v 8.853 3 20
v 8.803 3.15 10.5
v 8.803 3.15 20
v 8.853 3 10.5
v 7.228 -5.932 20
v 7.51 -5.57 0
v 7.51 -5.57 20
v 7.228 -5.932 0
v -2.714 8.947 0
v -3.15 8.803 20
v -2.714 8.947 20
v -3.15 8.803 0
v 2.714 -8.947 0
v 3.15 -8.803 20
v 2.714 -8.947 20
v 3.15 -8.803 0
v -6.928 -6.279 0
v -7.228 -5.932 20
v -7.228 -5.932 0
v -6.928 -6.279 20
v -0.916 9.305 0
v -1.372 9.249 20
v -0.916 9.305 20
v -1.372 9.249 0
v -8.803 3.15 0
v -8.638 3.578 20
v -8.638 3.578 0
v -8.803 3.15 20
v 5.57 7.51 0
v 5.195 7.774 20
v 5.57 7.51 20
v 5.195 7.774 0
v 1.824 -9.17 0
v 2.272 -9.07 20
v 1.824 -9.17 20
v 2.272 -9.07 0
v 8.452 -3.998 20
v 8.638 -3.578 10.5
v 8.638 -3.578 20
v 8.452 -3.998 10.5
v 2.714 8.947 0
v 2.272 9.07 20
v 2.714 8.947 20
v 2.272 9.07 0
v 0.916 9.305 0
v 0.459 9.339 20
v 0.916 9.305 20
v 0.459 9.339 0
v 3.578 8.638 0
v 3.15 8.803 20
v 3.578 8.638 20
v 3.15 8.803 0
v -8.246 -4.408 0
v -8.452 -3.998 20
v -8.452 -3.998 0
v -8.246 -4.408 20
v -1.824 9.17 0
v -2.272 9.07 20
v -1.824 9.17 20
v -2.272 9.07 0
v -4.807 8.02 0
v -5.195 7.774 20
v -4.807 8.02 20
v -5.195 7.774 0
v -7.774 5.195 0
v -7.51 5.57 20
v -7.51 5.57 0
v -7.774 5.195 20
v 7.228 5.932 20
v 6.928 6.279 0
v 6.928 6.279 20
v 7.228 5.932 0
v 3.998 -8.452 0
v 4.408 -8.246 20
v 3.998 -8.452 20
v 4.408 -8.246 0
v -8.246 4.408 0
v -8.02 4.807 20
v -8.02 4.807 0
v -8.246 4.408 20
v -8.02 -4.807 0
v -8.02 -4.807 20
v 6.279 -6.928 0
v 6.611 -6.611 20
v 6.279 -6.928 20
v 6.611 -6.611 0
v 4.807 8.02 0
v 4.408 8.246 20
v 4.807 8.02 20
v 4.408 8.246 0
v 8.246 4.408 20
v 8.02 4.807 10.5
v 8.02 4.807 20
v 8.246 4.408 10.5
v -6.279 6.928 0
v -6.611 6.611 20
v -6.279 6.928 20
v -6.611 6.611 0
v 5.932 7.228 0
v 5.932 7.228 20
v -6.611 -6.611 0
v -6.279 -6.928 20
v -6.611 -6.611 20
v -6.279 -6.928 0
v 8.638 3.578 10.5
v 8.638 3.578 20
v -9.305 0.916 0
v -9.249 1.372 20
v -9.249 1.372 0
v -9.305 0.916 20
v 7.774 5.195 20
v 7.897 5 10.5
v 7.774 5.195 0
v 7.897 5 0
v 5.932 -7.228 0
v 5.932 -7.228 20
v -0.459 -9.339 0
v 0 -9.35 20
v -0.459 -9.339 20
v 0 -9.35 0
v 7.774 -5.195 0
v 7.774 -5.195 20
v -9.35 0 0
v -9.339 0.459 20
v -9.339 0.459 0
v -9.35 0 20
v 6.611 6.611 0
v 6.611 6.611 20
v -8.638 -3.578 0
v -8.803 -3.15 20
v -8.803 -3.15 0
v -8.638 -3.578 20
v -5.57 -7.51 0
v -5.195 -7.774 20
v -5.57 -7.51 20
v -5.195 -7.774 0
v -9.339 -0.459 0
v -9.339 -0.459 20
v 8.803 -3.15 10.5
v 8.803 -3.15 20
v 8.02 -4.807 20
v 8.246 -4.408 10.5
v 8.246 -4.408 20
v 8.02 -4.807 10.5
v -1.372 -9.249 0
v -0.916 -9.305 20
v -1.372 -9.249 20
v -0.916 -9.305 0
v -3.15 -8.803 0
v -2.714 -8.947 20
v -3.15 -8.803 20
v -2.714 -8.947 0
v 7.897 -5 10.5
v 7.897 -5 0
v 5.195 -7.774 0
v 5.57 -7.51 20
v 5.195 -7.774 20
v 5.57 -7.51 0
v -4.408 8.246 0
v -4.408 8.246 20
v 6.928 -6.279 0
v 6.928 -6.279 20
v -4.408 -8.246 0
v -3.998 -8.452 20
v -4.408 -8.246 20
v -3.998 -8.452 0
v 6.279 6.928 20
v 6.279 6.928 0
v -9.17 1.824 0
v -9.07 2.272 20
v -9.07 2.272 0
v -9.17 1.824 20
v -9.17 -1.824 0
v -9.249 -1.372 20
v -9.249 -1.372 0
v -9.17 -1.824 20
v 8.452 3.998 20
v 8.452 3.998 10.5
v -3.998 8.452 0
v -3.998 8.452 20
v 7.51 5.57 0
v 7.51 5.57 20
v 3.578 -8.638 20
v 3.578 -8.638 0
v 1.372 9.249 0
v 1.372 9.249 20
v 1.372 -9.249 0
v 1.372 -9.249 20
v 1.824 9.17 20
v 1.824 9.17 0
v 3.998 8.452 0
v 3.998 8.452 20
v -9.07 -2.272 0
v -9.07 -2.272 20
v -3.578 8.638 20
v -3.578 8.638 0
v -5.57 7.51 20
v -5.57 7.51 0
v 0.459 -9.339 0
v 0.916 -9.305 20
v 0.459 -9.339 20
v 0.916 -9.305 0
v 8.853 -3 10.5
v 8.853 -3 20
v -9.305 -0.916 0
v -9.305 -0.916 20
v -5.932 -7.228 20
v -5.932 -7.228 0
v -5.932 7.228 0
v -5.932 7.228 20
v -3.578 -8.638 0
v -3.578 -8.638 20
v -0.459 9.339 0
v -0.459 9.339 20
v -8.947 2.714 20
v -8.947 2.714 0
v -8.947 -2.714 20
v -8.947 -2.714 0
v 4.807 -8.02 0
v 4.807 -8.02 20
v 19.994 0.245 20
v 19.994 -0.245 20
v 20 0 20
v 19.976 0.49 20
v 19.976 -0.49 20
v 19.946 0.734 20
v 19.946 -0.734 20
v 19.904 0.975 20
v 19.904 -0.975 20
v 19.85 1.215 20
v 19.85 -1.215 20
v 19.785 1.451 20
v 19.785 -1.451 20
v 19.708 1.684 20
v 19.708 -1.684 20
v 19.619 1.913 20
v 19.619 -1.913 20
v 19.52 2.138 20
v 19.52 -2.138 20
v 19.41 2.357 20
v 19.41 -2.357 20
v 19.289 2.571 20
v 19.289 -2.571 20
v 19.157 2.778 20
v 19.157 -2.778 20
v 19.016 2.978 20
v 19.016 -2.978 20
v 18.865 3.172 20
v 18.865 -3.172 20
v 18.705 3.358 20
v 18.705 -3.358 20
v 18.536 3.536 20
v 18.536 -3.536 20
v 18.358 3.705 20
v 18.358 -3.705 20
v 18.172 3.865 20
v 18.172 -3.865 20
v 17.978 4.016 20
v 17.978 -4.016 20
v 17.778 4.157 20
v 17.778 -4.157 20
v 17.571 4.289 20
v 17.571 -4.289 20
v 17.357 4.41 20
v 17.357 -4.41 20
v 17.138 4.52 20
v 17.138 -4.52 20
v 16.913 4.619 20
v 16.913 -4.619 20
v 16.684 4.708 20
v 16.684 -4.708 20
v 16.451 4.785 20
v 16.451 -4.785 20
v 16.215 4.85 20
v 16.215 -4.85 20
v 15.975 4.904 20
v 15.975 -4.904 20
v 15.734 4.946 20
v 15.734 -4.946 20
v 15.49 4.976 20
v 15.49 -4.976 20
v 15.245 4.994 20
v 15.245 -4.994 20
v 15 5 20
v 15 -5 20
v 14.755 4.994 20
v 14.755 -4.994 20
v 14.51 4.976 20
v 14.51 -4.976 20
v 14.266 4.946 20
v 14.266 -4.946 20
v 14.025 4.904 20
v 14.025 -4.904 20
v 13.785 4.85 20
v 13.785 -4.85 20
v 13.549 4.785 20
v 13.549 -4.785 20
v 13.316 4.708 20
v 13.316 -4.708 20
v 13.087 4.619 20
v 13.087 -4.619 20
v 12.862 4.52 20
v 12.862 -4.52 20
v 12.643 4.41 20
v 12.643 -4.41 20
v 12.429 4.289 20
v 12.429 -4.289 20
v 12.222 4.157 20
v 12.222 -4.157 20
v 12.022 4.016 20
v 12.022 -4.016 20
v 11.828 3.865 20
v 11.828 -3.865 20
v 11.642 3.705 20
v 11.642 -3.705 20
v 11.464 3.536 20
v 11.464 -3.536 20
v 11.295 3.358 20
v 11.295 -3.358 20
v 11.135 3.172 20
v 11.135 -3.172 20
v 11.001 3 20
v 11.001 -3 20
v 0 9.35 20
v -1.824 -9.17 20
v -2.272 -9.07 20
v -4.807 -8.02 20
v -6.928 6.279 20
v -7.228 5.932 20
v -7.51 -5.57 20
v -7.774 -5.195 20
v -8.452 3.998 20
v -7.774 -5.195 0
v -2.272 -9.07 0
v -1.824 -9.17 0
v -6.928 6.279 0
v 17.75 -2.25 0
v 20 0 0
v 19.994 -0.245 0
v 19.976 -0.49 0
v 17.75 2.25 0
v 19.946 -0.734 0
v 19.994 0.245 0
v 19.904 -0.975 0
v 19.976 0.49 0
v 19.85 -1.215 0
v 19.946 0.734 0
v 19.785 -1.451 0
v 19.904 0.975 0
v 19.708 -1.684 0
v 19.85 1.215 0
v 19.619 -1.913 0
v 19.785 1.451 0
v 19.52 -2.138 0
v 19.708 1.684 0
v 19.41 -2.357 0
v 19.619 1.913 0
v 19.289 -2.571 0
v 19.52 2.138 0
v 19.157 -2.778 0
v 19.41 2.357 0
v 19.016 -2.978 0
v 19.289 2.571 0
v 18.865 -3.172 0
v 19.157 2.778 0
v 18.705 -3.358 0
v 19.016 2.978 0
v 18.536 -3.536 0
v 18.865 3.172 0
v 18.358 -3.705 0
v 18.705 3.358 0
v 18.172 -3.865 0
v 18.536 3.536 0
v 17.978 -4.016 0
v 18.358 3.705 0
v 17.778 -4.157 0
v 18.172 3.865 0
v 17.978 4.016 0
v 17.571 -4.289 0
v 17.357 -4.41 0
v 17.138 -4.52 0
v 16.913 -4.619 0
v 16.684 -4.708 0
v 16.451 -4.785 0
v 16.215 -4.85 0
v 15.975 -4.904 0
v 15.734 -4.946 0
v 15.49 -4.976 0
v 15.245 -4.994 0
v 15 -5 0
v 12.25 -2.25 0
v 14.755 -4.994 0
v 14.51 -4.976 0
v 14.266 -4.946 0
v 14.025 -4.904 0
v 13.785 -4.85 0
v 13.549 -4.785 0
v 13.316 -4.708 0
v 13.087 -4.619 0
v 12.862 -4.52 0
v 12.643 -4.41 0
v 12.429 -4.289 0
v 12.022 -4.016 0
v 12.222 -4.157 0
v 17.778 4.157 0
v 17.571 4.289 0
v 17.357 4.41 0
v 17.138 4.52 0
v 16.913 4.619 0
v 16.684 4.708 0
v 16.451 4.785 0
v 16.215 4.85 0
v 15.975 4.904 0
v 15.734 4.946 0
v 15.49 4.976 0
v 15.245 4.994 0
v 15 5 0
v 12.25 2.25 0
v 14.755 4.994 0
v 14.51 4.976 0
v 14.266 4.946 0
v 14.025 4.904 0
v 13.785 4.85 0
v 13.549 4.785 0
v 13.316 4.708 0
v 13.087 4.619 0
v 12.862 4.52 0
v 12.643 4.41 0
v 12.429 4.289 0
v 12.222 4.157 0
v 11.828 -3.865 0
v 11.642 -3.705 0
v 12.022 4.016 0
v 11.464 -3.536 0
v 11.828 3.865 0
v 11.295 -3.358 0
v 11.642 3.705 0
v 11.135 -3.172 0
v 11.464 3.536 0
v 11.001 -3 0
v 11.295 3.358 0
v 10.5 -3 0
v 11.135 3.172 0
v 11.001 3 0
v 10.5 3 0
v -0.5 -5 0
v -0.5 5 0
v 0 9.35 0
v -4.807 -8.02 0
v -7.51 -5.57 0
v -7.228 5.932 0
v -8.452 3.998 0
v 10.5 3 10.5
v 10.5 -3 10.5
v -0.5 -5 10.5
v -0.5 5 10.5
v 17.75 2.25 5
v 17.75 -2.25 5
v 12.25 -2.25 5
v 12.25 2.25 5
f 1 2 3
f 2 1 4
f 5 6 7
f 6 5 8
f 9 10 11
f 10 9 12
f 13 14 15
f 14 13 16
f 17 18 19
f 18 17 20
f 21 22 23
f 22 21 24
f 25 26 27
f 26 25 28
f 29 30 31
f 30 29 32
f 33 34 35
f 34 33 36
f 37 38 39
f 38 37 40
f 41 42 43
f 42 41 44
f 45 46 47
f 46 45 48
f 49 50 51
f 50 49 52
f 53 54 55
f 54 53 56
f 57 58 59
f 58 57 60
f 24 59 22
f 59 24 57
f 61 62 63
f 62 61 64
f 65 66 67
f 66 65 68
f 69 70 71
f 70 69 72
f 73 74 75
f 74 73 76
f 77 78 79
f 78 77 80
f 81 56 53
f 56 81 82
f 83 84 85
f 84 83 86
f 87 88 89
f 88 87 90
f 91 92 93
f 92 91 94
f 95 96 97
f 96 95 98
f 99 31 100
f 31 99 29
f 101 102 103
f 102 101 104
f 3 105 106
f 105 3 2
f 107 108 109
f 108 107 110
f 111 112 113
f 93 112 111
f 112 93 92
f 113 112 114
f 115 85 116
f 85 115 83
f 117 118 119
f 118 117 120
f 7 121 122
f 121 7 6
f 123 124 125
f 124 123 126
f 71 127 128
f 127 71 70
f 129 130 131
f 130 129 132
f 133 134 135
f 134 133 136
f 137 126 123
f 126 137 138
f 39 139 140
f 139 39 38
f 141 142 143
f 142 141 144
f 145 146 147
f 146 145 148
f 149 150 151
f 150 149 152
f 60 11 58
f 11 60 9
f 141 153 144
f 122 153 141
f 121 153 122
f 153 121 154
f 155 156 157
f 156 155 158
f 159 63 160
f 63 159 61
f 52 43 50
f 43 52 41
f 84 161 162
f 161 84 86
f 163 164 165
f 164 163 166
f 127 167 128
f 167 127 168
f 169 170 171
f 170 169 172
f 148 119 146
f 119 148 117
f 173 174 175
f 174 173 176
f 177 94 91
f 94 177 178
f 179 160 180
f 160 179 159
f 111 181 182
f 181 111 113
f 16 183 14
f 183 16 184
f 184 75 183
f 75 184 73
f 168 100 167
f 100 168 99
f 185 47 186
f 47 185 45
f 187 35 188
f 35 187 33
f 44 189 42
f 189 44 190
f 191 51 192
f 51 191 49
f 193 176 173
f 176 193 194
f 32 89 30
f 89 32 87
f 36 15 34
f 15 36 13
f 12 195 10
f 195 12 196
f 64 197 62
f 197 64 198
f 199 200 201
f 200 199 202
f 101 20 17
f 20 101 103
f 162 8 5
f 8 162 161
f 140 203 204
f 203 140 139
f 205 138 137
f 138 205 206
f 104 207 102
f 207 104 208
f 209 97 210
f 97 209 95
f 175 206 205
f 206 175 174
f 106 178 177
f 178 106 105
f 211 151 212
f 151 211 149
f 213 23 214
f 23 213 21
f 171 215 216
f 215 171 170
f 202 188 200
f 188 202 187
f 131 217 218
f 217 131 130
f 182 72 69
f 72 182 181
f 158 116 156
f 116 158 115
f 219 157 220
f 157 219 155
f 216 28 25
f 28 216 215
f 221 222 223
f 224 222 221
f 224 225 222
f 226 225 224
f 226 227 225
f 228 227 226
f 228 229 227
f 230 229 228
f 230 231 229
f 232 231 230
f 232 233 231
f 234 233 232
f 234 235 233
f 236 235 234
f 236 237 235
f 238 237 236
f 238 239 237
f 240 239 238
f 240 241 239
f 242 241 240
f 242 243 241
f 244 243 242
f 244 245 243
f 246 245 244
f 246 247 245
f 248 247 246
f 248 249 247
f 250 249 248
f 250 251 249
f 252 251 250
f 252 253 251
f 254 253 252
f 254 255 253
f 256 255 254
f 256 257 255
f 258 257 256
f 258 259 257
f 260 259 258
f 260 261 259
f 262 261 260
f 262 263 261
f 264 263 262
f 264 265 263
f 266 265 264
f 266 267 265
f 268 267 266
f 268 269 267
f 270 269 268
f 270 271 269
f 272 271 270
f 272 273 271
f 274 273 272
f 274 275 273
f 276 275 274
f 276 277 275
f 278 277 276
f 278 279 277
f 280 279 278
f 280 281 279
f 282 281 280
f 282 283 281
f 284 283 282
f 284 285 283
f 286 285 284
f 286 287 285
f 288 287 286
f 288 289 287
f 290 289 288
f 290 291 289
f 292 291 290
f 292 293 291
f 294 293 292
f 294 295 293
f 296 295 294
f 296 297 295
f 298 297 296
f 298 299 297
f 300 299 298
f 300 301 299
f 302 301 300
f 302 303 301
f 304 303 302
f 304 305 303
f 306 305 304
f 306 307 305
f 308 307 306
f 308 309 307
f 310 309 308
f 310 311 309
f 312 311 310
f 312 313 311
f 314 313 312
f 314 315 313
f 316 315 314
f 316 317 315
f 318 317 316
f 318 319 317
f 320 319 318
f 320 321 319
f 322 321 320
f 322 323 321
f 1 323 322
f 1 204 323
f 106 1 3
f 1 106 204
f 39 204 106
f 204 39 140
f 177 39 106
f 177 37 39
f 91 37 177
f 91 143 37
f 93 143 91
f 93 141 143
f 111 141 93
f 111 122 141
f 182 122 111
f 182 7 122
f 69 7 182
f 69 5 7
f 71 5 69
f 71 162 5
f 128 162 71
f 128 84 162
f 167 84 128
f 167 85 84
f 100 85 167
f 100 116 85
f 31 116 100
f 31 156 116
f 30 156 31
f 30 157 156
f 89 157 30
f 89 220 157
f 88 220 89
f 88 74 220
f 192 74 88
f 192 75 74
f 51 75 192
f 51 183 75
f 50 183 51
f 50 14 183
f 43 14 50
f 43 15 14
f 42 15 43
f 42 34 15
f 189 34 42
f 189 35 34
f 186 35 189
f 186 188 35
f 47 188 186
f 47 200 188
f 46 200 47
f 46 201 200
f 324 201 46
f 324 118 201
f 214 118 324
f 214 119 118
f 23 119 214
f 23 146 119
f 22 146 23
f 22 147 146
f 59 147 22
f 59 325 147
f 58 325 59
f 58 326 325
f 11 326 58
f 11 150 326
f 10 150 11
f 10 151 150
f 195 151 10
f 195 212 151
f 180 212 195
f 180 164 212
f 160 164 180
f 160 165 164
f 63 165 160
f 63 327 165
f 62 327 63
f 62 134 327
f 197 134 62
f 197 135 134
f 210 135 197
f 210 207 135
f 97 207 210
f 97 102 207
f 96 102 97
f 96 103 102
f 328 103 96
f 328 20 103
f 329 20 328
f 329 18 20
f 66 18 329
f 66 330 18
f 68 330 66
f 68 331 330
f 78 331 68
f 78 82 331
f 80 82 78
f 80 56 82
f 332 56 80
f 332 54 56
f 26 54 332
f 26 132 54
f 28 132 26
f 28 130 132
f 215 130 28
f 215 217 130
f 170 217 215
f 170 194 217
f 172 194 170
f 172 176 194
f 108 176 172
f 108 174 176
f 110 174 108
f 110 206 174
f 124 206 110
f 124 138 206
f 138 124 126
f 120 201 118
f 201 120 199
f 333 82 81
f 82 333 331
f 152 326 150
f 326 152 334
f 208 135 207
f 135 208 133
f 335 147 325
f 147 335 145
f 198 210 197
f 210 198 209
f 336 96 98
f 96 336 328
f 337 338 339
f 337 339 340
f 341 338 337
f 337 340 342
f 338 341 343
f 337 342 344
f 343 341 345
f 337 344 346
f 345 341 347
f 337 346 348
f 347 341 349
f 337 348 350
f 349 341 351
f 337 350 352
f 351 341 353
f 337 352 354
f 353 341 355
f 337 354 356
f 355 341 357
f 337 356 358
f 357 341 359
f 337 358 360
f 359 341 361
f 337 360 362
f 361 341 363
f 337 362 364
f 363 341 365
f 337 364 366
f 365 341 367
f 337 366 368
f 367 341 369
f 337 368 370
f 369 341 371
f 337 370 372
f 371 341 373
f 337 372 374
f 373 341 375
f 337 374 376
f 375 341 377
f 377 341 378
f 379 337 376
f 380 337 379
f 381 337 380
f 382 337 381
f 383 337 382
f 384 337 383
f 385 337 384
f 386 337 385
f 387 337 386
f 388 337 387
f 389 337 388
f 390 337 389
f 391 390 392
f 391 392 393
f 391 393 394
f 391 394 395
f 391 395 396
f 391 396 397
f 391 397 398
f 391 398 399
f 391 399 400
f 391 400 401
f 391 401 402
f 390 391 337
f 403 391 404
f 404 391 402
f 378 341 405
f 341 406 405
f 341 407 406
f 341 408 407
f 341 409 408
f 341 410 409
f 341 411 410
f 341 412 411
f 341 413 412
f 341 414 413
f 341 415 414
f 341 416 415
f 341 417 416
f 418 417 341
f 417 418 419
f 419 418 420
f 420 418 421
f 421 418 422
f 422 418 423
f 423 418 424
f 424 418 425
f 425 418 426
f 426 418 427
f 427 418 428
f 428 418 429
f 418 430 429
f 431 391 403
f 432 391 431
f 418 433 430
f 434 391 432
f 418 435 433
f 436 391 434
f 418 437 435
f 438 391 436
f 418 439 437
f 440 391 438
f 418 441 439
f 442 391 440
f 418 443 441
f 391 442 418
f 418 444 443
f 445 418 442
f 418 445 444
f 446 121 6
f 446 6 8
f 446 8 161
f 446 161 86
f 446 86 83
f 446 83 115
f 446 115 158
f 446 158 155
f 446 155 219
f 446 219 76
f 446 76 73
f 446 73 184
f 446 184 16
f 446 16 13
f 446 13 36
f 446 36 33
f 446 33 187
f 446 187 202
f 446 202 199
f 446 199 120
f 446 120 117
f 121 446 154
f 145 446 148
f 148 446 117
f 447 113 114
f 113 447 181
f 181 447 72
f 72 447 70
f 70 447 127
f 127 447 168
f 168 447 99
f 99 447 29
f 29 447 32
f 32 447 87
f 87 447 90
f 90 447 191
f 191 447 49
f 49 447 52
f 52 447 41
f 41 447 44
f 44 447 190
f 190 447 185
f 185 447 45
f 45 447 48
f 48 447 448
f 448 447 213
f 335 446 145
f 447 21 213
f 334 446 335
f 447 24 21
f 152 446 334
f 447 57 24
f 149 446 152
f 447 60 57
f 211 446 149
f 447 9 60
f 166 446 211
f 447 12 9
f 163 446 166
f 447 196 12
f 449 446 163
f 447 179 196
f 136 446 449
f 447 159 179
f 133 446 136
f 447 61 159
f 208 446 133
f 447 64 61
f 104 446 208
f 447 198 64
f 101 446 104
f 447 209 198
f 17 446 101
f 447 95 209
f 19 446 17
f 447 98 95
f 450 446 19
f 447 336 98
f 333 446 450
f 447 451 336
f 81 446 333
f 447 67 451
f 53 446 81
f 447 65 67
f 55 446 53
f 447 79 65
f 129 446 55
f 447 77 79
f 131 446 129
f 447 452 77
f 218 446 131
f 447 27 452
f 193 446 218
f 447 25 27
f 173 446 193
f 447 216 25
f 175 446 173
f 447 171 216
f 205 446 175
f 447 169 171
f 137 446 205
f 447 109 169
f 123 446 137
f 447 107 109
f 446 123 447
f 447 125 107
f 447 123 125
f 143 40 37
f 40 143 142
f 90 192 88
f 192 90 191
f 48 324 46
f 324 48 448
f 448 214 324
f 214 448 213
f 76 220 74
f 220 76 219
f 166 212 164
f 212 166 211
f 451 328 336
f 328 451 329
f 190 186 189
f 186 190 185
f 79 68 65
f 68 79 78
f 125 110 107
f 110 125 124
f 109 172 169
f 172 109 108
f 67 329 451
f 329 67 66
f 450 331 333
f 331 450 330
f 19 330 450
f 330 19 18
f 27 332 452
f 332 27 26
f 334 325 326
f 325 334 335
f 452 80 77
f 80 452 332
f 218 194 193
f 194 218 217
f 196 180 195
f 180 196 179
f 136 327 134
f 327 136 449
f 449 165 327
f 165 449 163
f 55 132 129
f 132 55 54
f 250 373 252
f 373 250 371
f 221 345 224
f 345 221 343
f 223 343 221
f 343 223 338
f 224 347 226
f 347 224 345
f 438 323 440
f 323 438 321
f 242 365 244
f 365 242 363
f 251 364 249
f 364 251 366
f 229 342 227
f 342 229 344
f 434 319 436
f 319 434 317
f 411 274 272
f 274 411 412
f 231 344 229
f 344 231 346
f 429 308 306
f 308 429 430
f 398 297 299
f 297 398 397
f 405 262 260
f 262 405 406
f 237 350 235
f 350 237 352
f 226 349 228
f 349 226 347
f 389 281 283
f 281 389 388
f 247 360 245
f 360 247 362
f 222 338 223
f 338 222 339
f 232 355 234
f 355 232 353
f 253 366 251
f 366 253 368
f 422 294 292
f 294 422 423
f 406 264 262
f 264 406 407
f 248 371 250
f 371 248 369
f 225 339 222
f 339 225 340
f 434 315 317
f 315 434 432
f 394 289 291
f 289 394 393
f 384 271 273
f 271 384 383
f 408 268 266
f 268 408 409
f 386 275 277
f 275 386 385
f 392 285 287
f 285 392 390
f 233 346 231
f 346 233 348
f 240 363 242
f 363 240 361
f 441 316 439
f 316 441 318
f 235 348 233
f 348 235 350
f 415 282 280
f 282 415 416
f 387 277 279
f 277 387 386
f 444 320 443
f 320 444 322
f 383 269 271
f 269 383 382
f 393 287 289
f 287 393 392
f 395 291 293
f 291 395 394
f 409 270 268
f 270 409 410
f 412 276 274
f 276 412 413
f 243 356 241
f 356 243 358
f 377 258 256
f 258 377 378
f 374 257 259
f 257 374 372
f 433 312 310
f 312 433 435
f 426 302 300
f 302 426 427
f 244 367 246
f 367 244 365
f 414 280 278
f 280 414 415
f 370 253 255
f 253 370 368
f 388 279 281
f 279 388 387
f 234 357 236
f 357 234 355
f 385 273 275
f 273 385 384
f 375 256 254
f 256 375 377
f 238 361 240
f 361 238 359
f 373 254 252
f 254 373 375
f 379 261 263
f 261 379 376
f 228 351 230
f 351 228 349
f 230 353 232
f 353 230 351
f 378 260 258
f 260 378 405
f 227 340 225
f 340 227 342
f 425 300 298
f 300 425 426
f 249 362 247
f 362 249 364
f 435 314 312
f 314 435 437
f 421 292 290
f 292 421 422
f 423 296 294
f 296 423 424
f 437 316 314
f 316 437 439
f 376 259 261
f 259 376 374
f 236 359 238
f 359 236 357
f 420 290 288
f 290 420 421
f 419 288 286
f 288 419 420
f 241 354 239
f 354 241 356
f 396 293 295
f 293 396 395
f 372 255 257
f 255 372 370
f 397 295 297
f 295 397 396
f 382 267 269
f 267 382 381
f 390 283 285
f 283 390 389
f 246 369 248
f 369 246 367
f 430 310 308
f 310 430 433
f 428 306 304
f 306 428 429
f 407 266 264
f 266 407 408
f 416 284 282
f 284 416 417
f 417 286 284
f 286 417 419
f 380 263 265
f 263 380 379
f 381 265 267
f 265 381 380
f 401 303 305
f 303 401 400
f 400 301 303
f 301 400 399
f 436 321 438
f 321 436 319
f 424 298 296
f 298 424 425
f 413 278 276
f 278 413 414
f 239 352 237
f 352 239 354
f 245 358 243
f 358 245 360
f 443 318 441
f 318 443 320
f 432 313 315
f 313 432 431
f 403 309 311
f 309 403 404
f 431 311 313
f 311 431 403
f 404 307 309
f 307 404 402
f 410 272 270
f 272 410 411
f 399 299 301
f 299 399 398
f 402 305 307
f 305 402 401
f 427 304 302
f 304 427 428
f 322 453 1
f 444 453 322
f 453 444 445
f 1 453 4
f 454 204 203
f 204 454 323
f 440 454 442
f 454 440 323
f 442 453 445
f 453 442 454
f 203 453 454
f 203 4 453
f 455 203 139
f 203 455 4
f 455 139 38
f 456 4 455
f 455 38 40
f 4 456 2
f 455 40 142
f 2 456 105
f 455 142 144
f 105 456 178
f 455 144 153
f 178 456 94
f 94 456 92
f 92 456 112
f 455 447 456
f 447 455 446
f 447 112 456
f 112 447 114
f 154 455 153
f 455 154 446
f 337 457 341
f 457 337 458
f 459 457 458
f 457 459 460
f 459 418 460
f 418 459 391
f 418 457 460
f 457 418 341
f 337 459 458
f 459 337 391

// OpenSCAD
// Tubing clip for a 12.7 mm (1/2 inch) lab stand rod
// Print orientation: flat on the bed, extruded upward in +Z

// ---------- Parameters ----------
rod_d        = 12.7;   // stand rod diameter
ring_wall    = 3;      // rod ring wall thickness
ring_od      = rod_d + 2 * ring_wall;  // rod ring outer diameter (18.7 mm)
ring_open    = 10;     // rod ring opening width along -X

tube_d       = 6;      // tubing inner diameter
tube_wall    = 2;      // tubing wall thickness
tube_od      = tube_d + 2 * tube_wall;  // tubing outer diameter (10 mm)
tube_x       = 15;     // tubing ring centre X position
tube_open    = 4.5;    // tubing opening width along +X

bridge_x0    = 8;      // bridge start X
bridge_x1    = 12;     // bridge end X
bridge_w     = 6;      // bridge width along Y

eps          = 0.5;    // overcut for clean boolean differences
$fn          = 128;    // circle resolution

// ---------- Model ----------
difference() {
    union() {
        // Rod ring
        translate([0, 0, 0])
            cylinder(d = ring_od, h = ring_open + 10);

        // Tubing ring
        translate([tube_x, 0, 0])
            cylinder(d = tube_od, h = ring_open + 10);

        // Solid bridge between the rings
        translate([bridge_x0, -bridge_w / 2, 0])
            cube([bridge_x1 - bridge_x0, bridge_w, ring_open + 10]);
    }

    // Rod ring opening: removes everything with x < 0 and -5 < y < 5
    translate([-eps, -ring_open / 2, -eps])
        cube([ring_open + 2 * eps, ring_open, ring_open + 2 * eps]);

    // Tubing opening: removes x > 15 with -2.25 < y < 2.25
    translate([tube_x - tube_open / 2 - eps, -tube_open / 2, -eps])
        cube([tube_open + 2 * eps, tube_open, tube_open + 2 * eps]);
}
